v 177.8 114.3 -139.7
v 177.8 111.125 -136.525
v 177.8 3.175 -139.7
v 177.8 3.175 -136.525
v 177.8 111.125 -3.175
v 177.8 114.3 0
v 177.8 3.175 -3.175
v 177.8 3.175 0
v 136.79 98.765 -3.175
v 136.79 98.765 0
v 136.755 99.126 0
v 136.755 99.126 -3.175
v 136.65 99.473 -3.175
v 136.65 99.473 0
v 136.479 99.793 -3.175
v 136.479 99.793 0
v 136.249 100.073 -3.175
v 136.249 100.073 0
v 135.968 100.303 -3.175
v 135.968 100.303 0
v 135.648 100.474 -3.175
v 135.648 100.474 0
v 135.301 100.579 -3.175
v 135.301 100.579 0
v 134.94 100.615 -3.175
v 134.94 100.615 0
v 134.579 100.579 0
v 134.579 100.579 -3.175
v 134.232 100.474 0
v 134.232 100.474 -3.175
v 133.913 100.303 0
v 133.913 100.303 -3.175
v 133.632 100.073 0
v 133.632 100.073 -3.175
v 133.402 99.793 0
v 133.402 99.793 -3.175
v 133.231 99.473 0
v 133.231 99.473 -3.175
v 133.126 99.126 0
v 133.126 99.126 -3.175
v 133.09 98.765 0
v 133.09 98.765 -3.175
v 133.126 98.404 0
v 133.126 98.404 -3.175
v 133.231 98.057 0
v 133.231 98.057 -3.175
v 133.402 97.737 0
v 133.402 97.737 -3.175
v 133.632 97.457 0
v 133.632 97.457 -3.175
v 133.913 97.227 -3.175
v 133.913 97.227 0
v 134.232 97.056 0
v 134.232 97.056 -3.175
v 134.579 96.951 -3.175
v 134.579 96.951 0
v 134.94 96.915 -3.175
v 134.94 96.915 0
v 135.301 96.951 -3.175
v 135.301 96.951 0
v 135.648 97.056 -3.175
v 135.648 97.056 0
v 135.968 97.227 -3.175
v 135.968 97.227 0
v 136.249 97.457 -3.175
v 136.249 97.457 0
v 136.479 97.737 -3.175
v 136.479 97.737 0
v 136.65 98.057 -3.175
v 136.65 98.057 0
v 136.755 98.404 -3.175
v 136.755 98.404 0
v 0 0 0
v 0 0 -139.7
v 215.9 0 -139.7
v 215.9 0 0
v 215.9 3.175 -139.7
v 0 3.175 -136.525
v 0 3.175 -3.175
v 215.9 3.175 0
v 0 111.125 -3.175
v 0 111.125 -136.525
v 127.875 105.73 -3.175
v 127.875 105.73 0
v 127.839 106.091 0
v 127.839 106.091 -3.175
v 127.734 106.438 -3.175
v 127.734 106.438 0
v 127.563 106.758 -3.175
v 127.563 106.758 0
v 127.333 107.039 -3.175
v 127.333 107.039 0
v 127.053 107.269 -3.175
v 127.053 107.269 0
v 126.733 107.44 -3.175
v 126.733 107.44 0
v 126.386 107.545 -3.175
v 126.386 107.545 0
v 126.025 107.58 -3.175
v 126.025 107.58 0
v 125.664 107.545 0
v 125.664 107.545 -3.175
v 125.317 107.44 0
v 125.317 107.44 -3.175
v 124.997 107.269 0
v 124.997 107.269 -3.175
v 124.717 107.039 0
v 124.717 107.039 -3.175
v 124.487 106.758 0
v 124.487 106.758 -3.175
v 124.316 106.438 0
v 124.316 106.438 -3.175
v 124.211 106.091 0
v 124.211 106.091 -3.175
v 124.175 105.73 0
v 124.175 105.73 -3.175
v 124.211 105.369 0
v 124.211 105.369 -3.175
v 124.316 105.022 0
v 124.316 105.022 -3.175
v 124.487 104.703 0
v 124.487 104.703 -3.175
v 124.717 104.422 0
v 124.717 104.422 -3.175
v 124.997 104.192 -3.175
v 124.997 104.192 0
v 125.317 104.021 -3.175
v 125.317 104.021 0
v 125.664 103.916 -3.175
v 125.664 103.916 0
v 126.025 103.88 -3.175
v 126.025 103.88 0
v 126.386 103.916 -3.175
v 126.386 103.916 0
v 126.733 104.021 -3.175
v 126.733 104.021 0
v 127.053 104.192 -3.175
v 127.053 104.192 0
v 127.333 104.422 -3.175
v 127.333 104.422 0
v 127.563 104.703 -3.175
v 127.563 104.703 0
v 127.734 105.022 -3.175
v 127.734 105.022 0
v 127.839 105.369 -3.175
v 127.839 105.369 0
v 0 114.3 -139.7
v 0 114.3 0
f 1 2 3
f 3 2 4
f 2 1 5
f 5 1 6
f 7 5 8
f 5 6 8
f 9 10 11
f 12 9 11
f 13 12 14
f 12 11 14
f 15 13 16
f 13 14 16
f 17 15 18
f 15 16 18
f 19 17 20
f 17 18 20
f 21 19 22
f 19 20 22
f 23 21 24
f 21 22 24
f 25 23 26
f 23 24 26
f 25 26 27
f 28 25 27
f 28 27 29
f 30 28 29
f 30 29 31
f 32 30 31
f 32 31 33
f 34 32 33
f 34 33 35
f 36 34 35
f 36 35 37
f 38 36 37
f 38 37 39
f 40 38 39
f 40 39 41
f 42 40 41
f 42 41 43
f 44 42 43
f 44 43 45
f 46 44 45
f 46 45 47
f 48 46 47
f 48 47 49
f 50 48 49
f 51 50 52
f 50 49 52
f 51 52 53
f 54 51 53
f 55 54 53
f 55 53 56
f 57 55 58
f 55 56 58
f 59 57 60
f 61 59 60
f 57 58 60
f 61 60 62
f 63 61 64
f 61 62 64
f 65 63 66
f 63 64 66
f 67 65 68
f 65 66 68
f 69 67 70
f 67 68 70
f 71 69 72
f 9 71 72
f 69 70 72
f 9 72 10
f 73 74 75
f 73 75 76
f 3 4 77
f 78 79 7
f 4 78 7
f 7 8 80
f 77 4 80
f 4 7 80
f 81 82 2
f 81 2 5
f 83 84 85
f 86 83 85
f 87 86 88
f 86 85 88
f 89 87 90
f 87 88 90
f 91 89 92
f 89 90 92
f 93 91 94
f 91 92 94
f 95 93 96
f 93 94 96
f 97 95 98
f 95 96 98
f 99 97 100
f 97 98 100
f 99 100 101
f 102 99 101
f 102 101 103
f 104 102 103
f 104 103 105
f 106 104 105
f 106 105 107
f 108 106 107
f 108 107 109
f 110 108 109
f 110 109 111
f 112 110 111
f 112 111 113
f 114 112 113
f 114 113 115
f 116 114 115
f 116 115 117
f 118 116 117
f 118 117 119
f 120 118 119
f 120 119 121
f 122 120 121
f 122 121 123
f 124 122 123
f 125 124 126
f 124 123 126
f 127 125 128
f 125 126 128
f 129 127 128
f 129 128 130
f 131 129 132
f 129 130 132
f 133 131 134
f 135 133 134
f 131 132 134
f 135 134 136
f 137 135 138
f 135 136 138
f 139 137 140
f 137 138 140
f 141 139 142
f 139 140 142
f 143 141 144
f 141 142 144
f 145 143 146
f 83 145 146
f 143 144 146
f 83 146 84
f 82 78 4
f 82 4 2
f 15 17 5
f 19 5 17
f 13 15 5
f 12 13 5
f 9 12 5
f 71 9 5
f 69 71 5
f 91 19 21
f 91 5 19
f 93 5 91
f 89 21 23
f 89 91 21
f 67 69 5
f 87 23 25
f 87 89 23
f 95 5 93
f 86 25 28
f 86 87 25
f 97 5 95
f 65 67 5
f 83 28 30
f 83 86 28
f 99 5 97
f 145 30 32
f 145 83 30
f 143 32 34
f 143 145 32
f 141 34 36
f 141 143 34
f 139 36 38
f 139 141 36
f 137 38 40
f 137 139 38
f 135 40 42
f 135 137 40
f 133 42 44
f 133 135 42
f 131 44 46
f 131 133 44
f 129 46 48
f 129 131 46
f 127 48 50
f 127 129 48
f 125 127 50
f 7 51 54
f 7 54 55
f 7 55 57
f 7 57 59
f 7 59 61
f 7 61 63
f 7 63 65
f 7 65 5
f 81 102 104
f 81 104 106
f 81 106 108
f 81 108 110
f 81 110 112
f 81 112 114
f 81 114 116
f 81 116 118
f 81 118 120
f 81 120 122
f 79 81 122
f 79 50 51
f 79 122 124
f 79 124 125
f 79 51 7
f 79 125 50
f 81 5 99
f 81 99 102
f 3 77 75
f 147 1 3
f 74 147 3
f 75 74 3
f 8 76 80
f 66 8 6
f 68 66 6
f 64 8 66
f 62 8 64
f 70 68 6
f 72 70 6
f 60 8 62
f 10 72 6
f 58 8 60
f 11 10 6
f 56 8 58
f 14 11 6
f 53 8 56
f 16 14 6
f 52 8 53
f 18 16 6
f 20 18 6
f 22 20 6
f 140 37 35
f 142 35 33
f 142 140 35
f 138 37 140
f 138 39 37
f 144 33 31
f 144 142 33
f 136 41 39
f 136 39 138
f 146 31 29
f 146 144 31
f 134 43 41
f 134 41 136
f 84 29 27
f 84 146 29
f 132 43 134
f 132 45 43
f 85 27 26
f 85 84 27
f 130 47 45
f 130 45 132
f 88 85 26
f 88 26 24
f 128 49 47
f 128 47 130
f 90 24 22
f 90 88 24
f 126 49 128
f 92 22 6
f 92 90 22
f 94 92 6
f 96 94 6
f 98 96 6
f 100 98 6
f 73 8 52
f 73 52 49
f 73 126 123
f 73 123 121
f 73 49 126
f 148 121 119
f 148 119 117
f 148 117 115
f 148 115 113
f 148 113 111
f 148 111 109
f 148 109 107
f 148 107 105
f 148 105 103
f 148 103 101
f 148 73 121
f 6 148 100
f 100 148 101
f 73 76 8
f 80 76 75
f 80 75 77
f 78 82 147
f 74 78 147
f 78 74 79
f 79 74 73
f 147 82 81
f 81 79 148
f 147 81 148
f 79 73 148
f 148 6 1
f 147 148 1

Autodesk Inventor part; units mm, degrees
ref_plane "YZ Plane" through (0, 0, 0) normal (1, 0, 0) x (0, 1, 0)
ref_plane "XZ Plane" through (0, 0, 0) normal (0, 1, 0) x (-1, 0, 0)
ref_plane "XY Plane" through (0, 0, 0) normal (0, 0, 1) x (1, 0, 0)
sketch "Sketch1" plane through (0, 0, 0) normal (1, 0, 0) x (0, 1, 0)
  line L0 (0, 0) -> (114.3, 0)
  line L1 (114.3, 0) -> (114.3, -139.7)
  line L2 (114.3, -139.7) -> (0, -139.7)
  line L3 (0, -139.7) -> (0, 0)
  line L4 (111.125, -136.525) -> (111.125, -3.175)
  line L5 (111.125, -3.175) -> (3.175, -3.175)
  line L6 (3.175, -3.175) -> (3.175, -136.525)
  line L7 (3.175, -136.525) -> (111.125, -136.525)
  dimension "d0" = 114.3
  dimension "d1" = 139.7
  dimension "d2" = 3.175
extrude "Extrusion1" add sketch "Sketch1" along normal blind 215.9
sketch "Sketch2" plane through (0, 0, 0) normal (0, 0, 1) x (1, 0, 0)
  line L0 (215.9, 114.3) -> (177.8, 114.3)
  line L1 (177.8, 114.3) -> (177.8, 3.175)
  line L2 (177.8, 3.175) -> (215.9, 3.175)
  line L3 (215.9, 3.175) -> (215.9, 114.3)
  point P0 (0, 0)
  dimension "d5" = 38.1
  dimension "d6" = 111.125
extrude "Extrusion2" cut sketch "Sketch2" against normal through all
sketch "Sketch4" plane through (0, 0, 0) normal (0, 0, 1) x (1, 0, 0)
  line L0 (177.8, 3.175) -> (177.8, 114.3) projected
  line L1 (0, 114.3) -> (177.8, 114.3) projected
  circle A0 centre (127, 97.79) radius 4
  line L2 (127, 97.79) -> (134.9404, 98.765)
  line L3 (127, 97.79) -> (135, 97.79) construction
  line L4 (127, 97.79) -> (126.025, 105.7304)
  circle A1 centre (126.025, 105.7304) radius 1.85
  circle A2 centre (134.9404, 98.765) radius 1.85
  dimension "d13" = 50.8
  dimension "d14" = 16.51
  dimension "d15" = 8
  dimension "d16" = 8
  dimension "d17" = 353
  dimension "d18" = 8
  dimension "d19" = 3.7
  dimension "d20" = 3.7
  dimension "d23" = 90
extrude "Extrusion3" cut sketch "Sketch4" against normal blind 25.4 contours A1 | A2
properties part number "Bucket" material "Polycarbonate, Clear"
